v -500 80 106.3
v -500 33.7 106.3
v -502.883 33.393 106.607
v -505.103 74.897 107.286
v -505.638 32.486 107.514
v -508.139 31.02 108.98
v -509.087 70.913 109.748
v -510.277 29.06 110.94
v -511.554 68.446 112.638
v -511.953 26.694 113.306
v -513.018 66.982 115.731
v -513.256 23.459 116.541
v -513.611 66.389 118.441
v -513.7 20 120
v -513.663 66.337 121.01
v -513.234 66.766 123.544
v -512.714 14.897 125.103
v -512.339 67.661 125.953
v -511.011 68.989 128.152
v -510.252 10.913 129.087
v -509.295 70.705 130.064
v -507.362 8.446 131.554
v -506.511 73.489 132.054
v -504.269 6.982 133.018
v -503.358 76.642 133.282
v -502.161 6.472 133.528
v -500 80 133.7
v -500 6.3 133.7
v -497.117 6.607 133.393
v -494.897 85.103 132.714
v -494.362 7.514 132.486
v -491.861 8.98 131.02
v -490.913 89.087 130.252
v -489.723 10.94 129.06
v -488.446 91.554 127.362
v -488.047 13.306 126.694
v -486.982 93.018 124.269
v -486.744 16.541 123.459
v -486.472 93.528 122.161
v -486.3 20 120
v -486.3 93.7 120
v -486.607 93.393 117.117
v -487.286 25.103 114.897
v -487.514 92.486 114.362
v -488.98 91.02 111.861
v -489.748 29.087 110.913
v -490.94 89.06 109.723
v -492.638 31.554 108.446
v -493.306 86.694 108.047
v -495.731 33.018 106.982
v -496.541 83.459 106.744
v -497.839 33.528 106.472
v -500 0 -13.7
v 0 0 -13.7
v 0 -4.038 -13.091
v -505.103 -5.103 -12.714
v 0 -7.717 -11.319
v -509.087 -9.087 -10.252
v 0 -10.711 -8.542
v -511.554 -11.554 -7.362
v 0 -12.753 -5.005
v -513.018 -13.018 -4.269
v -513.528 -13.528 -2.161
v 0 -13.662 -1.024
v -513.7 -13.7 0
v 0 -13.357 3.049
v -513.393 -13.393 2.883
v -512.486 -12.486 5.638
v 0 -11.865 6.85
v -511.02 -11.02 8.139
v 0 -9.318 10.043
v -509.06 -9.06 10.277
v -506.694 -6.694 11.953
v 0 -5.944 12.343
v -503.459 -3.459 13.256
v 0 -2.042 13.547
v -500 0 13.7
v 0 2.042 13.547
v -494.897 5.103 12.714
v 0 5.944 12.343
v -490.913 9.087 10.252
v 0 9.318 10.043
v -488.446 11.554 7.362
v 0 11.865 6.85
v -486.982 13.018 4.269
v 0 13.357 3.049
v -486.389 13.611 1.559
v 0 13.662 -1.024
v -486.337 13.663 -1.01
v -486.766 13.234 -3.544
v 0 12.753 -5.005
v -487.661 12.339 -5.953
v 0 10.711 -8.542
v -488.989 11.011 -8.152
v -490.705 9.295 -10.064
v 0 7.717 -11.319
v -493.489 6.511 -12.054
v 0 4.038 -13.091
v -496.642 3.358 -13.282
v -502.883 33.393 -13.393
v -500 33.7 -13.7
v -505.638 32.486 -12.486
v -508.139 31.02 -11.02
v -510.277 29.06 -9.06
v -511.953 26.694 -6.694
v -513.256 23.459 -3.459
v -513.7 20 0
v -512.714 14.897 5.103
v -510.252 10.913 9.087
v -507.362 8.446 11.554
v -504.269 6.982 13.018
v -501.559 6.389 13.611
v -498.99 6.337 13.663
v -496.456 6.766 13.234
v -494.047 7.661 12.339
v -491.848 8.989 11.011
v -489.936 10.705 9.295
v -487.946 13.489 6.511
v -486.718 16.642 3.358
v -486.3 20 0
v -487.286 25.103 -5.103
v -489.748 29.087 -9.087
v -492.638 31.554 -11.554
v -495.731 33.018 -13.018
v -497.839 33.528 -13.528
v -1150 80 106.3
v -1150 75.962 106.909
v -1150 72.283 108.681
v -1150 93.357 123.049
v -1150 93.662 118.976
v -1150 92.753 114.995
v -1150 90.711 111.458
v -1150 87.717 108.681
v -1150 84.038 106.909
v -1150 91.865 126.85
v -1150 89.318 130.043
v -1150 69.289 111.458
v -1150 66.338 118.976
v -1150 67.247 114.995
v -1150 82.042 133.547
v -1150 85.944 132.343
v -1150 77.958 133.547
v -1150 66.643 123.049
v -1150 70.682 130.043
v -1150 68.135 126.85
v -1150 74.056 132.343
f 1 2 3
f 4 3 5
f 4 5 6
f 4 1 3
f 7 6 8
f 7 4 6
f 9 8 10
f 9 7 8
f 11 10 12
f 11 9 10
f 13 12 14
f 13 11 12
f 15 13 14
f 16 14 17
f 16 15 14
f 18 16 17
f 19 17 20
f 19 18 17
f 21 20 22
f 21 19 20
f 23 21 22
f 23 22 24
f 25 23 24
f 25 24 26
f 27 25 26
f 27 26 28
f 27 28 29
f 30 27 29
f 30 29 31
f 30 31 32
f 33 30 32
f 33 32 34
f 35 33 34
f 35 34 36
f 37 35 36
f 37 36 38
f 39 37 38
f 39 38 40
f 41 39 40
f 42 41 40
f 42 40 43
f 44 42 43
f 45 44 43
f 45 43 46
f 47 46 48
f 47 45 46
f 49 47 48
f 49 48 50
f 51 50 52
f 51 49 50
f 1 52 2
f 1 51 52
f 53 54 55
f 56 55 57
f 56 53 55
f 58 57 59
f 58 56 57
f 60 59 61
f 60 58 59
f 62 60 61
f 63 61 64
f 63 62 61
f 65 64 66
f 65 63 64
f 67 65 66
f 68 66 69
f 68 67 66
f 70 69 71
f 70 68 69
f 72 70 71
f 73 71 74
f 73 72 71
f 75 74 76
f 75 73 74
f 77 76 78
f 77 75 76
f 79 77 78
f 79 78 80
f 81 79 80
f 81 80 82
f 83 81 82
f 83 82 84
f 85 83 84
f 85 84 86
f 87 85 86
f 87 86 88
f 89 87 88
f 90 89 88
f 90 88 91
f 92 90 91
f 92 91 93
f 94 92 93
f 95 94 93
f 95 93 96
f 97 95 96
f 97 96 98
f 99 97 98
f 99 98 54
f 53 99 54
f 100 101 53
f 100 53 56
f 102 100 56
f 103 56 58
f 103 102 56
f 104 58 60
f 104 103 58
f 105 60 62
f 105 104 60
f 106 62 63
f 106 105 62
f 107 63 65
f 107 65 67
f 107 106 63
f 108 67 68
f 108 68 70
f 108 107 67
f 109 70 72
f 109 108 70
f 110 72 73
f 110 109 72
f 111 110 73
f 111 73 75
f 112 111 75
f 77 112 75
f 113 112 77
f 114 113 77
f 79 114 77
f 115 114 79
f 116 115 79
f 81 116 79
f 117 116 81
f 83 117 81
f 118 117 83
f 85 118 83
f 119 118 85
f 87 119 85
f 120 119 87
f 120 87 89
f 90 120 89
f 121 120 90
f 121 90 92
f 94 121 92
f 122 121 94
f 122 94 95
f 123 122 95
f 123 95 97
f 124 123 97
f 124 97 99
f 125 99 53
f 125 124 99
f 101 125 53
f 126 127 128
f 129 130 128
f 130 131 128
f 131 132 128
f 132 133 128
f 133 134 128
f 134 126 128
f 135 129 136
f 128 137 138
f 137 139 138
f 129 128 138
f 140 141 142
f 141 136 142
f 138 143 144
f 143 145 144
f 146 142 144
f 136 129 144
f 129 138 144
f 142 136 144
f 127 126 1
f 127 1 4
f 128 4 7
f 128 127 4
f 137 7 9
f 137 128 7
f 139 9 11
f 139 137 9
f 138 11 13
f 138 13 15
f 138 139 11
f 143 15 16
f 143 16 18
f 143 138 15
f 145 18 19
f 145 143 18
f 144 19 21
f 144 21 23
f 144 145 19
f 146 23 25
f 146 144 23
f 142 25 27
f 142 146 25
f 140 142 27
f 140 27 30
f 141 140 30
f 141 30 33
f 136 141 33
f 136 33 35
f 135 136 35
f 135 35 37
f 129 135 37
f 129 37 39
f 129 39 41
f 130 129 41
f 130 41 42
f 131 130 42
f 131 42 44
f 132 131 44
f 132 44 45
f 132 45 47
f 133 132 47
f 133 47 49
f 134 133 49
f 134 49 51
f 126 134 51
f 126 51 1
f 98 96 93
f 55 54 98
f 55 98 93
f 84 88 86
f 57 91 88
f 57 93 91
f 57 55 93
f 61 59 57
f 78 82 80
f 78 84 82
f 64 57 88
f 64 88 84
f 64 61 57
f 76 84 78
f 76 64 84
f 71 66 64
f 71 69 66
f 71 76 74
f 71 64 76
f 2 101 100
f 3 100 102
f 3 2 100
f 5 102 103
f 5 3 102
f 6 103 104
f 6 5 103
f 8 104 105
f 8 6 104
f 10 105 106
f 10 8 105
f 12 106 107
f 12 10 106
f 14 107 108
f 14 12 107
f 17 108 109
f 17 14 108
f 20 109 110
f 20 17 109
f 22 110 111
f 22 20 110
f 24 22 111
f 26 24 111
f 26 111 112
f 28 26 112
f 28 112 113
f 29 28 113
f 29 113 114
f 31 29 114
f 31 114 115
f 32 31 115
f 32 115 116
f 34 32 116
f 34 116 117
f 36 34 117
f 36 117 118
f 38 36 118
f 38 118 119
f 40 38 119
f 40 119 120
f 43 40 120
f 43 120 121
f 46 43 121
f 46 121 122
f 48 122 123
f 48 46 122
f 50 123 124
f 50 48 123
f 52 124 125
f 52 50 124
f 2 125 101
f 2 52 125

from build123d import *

# Parameters (mm, degrees)
CROQUIS1_R = 13.7


with BuildPart() as part:
    # Barrer1: sweep along a curve in space
    with BuildLine() as barrer1_path:
        Line((0, 0, 0), (-500, 0, 0))
        Line((-500, 0, 0), (-500, 20, 0))
        Line((-500, 20, 0), (-500, 20, 120))
        Line((-500, 20, 120), (-500, 80, 120))
        Line((-500, 80, 120), (-1150, 80, 120))
    # Croquis1 → Barrer1 (sweep)
    with BuildSketch(Plane(origin=(0, 0, 0), x_dir=(0, 0, -1), z_dir=(1, 0, 0))):
        Circle(CROQUIS1_R)
    sweep(path=barrer1_path.line, transition=Transition.RIGHT)


solid = part.part
